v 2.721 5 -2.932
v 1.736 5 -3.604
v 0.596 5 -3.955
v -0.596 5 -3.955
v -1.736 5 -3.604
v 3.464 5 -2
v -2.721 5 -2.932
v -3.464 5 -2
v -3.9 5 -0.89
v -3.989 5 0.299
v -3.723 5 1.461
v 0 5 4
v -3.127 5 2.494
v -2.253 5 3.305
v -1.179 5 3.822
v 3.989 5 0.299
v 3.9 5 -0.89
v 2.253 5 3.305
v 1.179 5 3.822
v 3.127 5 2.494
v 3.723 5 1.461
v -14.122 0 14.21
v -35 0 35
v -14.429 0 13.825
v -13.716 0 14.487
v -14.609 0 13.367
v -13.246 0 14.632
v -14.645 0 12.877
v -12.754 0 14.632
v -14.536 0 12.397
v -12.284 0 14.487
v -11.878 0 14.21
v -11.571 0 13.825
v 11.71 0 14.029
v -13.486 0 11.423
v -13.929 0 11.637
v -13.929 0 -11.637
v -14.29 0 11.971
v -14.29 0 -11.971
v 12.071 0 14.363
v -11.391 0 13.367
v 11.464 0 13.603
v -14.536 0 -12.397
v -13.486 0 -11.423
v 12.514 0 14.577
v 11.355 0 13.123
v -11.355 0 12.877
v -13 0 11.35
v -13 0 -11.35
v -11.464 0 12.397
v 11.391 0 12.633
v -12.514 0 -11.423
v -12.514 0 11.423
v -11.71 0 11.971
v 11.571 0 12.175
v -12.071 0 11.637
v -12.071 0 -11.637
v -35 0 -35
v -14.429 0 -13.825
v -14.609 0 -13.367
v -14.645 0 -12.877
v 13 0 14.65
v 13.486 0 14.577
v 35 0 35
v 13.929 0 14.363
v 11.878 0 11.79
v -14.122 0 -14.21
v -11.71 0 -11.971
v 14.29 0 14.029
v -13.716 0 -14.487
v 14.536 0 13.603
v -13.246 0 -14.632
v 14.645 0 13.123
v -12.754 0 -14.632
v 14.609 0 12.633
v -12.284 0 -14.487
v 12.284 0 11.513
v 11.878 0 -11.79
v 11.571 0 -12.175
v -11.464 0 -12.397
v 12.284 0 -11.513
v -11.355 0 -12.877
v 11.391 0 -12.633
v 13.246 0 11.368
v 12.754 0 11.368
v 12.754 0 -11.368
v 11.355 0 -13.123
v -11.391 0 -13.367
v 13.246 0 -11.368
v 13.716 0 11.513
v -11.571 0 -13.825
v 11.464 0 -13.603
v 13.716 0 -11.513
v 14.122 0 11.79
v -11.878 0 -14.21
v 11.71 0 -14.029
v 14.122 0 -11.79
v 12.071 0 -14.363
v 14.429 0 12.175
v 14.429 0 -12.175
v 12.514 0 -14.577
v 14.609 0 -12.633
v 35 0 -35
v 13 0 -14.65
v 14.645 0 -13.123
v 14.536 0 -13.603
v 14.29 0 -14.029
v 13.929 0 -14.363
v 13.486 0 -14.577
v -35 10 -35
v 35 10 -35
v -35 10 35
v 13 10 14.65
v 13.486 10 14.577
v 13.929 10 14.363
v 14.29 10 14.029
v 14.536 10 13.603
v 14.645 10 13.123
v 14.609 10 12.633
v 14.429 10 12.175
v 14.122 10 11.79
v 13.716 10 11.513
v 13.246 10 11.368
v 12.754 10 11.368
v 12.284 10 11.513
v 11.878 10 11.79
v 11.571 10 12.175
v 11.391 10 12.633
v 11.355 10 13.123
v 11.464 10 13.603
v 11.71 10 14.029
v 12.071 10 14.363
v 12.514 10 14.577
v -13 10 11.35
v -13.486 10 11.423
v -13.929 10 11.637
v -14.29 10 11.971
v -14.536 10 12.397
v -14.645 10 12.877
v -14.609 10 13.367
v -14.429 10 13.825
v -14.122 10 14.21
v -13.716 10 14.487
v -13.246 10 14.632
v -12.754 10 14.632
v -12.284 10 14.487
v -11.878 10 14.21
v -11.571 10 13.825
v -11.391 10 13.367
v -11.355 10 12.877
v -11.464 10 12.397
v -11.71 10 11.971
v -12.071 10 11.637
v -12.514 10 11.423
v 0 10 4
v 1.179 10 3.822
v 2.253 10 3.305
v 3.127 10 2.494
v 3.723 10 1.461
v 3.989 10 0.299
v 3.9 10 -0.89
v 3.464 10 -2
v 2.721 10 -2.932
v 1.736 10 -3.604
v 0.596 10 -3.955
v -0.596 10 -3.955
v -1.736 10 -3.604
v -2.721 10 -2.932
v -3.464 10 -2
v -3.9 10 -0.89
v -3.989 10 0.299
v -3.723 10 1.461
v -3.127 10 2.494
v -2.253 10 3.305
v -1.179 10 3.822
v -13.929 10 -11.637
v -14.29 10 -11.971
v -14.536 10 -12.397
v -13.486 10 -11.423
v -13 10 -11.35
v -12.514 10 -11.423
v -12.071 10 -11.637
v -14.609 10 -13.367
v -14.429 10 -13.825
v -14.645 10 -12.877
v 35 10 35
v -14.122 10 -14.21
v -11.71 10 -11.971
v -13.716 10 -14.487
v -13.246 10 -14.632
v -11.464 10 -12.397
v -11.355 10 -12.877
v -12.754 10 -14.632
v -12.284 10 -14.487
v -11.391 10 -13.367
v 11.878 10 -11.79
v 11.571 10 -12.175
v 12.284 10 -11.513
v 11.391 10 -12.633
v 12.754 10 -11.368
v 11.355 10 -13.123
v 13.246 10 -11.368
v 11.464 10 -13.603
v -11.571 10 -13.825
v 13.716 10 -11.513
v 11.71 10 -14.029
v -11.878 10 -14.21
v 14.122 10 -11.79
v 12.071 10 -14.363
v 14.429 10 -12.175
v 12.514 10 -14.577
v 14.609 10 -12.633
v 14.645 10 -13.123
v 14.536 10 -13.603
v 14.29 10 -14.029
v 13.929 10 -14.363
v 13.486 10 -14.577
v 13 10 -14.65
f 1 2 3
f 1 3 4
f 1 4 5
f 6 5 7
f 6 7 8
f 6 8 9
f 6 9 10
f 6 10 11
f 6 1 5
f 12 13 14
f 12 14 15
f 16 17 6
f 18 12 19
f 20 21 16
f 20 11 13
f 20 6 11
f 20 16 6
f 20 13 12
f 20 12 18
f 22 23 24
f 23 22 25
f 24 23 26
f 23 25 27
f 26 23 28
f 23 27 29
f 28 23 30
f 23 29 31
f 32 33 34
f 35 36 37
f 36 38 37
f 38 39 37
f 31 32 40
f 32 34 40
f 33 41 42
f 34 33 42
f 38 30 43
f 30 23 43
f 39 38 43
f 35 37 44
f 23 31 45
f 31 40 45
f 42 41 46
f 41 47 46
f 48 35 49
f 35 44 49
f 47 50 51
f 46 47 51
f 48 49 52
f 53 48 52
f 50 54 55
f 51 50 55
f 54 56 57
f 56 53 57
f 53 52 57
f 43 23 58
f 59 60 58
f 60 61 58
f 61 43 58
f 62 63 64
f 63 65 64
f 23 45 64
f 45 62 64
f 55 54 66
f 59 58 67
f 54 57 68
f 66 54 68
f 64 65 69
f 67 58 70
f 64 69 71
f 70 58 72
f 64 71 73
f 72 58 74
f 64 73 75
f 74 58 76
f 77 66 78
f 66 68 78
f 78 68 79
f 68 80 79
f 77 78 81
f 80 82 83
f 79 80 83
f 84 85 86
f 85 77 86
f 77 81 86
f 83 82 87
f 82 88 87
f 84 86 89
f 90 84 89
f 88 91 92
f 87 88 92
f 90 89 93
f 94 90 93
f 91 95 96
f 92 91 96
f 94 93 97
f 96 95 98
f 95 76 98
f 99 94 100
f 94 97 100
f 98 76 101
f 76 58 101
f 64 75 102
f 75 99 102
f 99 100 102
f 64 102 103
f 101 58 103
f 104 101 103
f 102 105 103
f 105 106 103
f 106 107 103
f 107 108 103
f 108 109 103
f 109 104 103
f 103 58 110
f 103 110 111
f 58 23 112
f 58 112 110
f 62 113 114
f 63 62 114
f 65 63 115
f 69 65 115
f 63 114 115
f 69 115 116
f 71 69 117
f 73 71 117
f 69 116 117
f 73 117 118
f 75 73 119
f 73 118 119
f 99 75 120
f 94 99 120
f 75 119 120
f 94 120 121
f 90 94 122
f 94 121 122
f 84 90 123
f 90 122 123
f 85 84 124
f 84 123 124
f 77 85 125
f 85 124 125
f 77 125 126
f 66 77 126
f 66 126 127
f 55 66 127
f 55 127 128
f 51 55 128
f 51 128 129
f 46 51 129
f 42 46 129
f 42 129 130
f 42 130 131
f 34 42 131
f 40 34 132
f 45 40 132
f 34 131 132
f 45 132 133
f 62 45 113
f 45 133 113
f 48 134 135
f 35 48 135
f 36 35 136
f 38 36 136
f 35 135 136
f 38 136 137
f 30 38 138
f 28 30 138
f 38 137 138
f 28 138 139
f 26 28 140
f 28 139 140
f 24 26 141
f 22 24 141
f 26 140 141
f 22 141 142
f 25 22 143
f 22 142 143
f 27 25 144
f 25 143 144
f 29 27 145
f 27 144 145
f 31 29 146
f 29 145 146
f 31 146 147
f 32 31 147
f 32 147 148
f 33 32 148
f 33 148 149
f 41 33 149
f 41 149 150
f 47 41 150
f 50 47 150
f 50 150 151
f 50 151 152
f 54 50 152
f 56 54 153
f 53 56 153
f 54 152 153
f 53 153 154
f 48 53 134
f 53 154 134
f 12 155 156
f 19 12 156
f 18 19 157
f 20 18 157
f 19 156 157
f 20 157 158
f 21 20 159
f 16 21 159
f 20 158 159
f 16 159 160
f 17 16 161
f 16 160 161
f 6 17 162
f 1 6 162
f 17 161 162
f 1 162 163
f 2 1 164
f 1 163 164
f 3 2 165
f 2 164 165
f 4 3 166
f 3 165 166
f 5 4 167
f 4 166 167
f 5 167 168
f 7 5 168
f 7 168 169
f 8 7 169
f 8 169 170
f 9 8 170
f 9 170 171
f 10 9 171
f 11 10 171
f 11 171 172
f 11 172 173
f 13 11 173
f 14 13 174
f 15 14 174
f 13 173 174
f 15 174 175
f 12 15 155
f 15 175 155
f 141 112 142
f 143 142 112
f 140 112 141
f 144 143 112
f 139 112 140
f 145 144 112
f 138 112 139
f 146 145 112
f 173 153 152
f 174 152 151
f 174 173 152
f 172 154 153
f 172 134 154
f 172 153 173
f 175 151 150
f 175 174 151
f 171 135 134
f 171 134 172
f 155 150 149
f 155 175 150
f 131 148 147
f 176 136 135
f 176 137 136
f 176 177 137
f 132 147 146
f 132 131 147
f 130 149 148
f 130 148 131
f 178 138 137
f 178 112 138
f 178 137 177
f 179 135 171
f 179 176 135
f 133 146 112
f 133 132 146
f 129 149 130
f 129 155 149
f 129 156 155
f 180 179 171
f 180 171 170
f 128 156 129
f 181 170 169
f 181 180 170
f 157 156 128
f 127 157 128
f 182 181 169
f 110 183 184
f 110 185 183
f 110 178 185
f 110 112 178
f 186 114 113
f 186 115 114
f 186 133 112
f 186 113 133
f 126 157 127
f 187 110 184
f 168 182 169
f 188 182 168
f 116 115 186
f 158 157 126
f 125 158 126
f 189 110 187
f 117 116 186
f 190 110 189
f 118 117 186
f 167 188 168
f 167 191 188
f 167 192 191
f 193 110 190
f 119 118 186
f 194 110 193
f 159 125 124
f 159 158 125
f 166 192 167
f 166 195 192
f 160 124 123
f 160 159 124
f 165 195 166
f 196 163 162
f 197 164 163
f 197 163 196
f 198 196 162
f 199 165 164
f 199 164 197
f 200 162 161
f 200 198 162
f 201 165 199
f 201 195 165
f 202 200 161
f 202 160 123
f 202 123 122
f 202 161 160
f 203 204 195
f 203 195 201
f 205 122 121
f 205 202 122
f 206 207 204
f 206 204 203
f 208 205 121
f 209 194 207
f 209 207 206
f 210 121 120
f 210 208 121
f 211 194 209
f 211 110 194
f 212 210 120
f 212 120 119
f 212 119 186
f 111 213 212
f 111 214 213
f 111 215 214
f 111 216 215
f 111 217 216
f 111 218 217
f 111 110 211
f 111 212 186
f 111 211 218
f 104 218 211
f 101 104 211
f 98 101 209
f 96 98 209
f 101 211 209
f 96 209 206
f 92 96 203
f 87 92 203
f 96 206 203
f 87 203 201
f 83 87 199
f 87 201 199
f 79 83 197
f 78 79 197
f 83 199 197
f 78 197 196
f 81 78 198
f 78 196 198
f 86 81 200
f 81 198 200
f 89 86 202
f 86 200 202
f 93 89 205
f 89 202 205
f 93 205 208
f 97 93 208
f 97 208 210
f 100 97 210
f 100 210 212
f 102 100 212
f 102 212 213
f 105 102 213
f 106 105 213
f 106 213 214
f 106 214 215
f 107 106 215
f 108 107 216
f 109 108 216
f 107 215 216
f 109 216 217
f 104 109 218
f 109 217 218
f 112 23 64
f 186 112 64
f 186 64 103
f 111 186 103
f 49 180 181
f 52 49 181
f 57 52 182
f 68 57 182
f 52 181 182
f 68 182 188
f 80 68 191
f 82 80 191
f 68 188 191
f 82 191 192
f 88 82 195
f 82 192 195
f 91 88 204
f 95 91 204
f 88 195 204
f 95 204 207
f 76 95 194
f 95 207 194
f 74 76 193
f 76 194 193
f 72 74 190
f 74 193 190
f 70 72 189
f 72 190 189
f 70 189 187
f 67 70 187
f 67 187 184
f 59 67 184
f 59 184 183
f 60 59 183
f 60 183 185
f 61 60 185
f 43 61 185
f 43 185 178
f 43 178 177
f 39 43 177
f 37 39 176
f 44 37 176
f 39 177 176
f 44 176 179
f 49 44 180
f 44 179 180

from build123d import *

# Parameters (mm, degrees)
SKETCH1_W           = 70
SKETCH1_H           = 70
BOSS_EXTRUDE1_DEPTH = 10
SKETCH2_R           = 1.65
CUT_EXTRUDE1_DEPTH  = 10
SKETCH3_R           = 4
CUT_EXTRUDE2_DEPTH  = 5


with BuildPart() as part:
    # Sketch1 → Boss-Extrude1 (new body)
    with BuildSketch(Plane(origin=(0, 0, 0), x_dir=(1, 0, 0), z_dir=(0, 1, 0))):
        Rectangle(SKETCH1_W, SKETCH1_H)
    extrude(amount=BOSS_EXTRUDE1_DEPTH)

    # Sketch2 → Cut-Extrude1 (cut)
    with BuildSketch(Plane(origin=(0, 10, 0), x_dir=(1, 0, 0), z_dir=(0, 1, 0))):
        with Locations(Location((-13, 13, 0), (0, 0, 270))):
            Circle(SKETCH2_R)
        with Locations(Location((13, 13, 0), (0, 0, 90))):
            Circle(SKETCH2_R)
        with Locations(Location((13, -13, 0), (0, 0, 270))):
            Circle(SKETCH2_R)
        with Locations(Location((-13, -13, 0), (0, 0, 90))):
            Circle(SKETCH2_R)
    extrude(amount=-CUT_EXTRUDE1_DEPTH, mode=Mode.SUBTRACT)

    # Sketch3 → Cut-Extrude2 (cut)
    with BuildSketch(Plane(origin=(0, 10, 0), x_dir=(1, 0, 0), z_dir=(0, 1, 0))):
        with Locations(Location((0, 0, 0), (0, 0, 270))):
            Circle(SKETCH3_R)
    extrude(amount=-CUT_EXTRUDE2_DEPTH, mode=Mode.SUBTRACT)


solid = part.part
